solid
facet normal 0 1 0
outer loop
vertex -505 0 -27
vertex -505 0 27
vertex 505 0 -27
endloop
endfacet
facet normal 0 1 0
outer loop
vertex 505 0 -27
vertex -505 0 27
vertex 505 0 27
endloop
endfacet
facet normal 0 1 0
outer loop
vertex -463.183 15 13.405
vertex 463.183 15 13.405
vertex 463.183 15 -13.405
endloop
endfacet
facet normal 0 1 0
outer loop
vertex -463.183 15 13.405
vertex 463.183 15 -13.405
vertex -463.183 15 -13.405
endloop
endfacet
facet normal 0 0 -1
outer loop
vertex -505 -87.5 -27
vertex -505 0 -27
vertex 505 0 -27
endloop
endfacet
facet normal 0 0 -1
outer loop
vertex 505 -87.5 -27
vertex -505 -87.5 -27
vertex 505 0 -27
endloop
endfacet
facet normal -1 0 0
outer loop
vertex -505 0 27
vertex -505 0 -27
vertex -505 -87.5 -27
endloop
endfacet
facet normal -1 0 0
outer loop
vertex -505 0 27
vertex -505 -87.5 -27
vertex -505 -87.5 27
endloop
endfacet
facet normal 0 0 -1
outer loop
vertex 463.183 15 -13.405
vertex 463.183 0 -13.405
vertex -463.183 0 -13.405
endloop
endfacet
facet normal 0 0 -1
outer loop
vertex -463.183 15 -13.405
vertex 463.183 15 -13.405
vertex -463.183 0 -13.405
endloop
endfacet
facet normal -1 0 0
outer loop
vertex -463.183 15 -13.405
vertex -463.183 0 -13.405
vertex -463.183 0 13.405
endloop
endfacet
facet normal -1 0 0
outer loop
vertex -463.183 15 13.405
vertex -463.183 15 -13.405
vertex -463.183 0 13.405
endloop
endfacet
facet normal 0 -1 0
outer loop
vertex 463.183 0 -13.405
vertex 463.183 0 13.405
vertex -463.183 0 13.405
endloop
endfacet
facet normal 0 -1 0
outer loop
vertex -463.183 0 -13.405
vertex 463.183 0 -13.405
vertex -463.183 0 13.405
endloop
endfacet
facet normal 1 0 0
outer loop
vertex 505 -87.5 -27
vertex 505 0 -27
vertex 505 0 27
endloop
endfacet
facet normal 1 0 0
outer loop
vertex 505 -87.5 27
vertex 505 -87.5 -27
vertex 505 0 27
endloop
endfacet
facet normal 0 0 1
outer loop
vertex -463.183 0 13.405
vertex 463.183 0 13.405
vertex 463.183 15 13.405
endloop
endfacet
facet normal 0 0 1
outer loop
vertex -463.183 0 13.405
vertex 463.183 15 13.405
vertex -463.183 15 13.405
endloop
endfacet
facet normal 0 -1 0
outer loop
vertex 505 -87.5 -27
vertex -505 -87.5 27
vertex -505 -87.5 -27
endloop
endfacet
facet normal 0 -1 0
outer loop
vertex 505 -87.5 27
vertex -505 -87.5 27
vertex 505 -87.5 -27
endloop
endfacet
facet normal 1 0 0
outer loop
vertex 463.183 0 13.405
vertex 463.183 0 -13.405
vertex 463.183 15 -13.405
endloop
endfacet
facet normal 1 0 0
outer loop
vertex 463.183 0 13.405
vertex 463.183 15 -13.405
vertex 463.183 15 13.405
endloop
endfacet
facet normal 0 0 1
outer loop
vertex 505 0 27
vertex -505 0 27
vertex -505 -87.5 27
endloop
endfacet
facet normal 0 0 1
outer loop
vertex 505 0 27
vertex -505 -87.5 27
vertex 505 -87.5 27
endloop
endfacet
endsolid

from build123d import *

# Parameters (mm, degrees)
F0_W     = 1010
F0_H     = 54
F1_DEPTH = 87.5
F2_W     = 926.366032
F2_H     = 26.809566
F3_DEPTH = 15


with BuildPart() as f1:
    # F0 (on Front) → F1 (new body)
    with BuildSketch(Plane.XZ):
        Rectangle(F0_W, F0_H)
    extrude(amount=F1_DEPTH)


with BuildPart() as f3:
    # F2 (on face) → F3 (new body)
    with BuildSketch(Plane(origin=(0, 0, 0), x_dir=(-1, 0, 0), z_dir=(0, 1, 0))):
        Rectangle(F2_W, F2_H)
    extrude(amount=F3_DEPTH)


solid = Compound([f1.part, f3.part])
